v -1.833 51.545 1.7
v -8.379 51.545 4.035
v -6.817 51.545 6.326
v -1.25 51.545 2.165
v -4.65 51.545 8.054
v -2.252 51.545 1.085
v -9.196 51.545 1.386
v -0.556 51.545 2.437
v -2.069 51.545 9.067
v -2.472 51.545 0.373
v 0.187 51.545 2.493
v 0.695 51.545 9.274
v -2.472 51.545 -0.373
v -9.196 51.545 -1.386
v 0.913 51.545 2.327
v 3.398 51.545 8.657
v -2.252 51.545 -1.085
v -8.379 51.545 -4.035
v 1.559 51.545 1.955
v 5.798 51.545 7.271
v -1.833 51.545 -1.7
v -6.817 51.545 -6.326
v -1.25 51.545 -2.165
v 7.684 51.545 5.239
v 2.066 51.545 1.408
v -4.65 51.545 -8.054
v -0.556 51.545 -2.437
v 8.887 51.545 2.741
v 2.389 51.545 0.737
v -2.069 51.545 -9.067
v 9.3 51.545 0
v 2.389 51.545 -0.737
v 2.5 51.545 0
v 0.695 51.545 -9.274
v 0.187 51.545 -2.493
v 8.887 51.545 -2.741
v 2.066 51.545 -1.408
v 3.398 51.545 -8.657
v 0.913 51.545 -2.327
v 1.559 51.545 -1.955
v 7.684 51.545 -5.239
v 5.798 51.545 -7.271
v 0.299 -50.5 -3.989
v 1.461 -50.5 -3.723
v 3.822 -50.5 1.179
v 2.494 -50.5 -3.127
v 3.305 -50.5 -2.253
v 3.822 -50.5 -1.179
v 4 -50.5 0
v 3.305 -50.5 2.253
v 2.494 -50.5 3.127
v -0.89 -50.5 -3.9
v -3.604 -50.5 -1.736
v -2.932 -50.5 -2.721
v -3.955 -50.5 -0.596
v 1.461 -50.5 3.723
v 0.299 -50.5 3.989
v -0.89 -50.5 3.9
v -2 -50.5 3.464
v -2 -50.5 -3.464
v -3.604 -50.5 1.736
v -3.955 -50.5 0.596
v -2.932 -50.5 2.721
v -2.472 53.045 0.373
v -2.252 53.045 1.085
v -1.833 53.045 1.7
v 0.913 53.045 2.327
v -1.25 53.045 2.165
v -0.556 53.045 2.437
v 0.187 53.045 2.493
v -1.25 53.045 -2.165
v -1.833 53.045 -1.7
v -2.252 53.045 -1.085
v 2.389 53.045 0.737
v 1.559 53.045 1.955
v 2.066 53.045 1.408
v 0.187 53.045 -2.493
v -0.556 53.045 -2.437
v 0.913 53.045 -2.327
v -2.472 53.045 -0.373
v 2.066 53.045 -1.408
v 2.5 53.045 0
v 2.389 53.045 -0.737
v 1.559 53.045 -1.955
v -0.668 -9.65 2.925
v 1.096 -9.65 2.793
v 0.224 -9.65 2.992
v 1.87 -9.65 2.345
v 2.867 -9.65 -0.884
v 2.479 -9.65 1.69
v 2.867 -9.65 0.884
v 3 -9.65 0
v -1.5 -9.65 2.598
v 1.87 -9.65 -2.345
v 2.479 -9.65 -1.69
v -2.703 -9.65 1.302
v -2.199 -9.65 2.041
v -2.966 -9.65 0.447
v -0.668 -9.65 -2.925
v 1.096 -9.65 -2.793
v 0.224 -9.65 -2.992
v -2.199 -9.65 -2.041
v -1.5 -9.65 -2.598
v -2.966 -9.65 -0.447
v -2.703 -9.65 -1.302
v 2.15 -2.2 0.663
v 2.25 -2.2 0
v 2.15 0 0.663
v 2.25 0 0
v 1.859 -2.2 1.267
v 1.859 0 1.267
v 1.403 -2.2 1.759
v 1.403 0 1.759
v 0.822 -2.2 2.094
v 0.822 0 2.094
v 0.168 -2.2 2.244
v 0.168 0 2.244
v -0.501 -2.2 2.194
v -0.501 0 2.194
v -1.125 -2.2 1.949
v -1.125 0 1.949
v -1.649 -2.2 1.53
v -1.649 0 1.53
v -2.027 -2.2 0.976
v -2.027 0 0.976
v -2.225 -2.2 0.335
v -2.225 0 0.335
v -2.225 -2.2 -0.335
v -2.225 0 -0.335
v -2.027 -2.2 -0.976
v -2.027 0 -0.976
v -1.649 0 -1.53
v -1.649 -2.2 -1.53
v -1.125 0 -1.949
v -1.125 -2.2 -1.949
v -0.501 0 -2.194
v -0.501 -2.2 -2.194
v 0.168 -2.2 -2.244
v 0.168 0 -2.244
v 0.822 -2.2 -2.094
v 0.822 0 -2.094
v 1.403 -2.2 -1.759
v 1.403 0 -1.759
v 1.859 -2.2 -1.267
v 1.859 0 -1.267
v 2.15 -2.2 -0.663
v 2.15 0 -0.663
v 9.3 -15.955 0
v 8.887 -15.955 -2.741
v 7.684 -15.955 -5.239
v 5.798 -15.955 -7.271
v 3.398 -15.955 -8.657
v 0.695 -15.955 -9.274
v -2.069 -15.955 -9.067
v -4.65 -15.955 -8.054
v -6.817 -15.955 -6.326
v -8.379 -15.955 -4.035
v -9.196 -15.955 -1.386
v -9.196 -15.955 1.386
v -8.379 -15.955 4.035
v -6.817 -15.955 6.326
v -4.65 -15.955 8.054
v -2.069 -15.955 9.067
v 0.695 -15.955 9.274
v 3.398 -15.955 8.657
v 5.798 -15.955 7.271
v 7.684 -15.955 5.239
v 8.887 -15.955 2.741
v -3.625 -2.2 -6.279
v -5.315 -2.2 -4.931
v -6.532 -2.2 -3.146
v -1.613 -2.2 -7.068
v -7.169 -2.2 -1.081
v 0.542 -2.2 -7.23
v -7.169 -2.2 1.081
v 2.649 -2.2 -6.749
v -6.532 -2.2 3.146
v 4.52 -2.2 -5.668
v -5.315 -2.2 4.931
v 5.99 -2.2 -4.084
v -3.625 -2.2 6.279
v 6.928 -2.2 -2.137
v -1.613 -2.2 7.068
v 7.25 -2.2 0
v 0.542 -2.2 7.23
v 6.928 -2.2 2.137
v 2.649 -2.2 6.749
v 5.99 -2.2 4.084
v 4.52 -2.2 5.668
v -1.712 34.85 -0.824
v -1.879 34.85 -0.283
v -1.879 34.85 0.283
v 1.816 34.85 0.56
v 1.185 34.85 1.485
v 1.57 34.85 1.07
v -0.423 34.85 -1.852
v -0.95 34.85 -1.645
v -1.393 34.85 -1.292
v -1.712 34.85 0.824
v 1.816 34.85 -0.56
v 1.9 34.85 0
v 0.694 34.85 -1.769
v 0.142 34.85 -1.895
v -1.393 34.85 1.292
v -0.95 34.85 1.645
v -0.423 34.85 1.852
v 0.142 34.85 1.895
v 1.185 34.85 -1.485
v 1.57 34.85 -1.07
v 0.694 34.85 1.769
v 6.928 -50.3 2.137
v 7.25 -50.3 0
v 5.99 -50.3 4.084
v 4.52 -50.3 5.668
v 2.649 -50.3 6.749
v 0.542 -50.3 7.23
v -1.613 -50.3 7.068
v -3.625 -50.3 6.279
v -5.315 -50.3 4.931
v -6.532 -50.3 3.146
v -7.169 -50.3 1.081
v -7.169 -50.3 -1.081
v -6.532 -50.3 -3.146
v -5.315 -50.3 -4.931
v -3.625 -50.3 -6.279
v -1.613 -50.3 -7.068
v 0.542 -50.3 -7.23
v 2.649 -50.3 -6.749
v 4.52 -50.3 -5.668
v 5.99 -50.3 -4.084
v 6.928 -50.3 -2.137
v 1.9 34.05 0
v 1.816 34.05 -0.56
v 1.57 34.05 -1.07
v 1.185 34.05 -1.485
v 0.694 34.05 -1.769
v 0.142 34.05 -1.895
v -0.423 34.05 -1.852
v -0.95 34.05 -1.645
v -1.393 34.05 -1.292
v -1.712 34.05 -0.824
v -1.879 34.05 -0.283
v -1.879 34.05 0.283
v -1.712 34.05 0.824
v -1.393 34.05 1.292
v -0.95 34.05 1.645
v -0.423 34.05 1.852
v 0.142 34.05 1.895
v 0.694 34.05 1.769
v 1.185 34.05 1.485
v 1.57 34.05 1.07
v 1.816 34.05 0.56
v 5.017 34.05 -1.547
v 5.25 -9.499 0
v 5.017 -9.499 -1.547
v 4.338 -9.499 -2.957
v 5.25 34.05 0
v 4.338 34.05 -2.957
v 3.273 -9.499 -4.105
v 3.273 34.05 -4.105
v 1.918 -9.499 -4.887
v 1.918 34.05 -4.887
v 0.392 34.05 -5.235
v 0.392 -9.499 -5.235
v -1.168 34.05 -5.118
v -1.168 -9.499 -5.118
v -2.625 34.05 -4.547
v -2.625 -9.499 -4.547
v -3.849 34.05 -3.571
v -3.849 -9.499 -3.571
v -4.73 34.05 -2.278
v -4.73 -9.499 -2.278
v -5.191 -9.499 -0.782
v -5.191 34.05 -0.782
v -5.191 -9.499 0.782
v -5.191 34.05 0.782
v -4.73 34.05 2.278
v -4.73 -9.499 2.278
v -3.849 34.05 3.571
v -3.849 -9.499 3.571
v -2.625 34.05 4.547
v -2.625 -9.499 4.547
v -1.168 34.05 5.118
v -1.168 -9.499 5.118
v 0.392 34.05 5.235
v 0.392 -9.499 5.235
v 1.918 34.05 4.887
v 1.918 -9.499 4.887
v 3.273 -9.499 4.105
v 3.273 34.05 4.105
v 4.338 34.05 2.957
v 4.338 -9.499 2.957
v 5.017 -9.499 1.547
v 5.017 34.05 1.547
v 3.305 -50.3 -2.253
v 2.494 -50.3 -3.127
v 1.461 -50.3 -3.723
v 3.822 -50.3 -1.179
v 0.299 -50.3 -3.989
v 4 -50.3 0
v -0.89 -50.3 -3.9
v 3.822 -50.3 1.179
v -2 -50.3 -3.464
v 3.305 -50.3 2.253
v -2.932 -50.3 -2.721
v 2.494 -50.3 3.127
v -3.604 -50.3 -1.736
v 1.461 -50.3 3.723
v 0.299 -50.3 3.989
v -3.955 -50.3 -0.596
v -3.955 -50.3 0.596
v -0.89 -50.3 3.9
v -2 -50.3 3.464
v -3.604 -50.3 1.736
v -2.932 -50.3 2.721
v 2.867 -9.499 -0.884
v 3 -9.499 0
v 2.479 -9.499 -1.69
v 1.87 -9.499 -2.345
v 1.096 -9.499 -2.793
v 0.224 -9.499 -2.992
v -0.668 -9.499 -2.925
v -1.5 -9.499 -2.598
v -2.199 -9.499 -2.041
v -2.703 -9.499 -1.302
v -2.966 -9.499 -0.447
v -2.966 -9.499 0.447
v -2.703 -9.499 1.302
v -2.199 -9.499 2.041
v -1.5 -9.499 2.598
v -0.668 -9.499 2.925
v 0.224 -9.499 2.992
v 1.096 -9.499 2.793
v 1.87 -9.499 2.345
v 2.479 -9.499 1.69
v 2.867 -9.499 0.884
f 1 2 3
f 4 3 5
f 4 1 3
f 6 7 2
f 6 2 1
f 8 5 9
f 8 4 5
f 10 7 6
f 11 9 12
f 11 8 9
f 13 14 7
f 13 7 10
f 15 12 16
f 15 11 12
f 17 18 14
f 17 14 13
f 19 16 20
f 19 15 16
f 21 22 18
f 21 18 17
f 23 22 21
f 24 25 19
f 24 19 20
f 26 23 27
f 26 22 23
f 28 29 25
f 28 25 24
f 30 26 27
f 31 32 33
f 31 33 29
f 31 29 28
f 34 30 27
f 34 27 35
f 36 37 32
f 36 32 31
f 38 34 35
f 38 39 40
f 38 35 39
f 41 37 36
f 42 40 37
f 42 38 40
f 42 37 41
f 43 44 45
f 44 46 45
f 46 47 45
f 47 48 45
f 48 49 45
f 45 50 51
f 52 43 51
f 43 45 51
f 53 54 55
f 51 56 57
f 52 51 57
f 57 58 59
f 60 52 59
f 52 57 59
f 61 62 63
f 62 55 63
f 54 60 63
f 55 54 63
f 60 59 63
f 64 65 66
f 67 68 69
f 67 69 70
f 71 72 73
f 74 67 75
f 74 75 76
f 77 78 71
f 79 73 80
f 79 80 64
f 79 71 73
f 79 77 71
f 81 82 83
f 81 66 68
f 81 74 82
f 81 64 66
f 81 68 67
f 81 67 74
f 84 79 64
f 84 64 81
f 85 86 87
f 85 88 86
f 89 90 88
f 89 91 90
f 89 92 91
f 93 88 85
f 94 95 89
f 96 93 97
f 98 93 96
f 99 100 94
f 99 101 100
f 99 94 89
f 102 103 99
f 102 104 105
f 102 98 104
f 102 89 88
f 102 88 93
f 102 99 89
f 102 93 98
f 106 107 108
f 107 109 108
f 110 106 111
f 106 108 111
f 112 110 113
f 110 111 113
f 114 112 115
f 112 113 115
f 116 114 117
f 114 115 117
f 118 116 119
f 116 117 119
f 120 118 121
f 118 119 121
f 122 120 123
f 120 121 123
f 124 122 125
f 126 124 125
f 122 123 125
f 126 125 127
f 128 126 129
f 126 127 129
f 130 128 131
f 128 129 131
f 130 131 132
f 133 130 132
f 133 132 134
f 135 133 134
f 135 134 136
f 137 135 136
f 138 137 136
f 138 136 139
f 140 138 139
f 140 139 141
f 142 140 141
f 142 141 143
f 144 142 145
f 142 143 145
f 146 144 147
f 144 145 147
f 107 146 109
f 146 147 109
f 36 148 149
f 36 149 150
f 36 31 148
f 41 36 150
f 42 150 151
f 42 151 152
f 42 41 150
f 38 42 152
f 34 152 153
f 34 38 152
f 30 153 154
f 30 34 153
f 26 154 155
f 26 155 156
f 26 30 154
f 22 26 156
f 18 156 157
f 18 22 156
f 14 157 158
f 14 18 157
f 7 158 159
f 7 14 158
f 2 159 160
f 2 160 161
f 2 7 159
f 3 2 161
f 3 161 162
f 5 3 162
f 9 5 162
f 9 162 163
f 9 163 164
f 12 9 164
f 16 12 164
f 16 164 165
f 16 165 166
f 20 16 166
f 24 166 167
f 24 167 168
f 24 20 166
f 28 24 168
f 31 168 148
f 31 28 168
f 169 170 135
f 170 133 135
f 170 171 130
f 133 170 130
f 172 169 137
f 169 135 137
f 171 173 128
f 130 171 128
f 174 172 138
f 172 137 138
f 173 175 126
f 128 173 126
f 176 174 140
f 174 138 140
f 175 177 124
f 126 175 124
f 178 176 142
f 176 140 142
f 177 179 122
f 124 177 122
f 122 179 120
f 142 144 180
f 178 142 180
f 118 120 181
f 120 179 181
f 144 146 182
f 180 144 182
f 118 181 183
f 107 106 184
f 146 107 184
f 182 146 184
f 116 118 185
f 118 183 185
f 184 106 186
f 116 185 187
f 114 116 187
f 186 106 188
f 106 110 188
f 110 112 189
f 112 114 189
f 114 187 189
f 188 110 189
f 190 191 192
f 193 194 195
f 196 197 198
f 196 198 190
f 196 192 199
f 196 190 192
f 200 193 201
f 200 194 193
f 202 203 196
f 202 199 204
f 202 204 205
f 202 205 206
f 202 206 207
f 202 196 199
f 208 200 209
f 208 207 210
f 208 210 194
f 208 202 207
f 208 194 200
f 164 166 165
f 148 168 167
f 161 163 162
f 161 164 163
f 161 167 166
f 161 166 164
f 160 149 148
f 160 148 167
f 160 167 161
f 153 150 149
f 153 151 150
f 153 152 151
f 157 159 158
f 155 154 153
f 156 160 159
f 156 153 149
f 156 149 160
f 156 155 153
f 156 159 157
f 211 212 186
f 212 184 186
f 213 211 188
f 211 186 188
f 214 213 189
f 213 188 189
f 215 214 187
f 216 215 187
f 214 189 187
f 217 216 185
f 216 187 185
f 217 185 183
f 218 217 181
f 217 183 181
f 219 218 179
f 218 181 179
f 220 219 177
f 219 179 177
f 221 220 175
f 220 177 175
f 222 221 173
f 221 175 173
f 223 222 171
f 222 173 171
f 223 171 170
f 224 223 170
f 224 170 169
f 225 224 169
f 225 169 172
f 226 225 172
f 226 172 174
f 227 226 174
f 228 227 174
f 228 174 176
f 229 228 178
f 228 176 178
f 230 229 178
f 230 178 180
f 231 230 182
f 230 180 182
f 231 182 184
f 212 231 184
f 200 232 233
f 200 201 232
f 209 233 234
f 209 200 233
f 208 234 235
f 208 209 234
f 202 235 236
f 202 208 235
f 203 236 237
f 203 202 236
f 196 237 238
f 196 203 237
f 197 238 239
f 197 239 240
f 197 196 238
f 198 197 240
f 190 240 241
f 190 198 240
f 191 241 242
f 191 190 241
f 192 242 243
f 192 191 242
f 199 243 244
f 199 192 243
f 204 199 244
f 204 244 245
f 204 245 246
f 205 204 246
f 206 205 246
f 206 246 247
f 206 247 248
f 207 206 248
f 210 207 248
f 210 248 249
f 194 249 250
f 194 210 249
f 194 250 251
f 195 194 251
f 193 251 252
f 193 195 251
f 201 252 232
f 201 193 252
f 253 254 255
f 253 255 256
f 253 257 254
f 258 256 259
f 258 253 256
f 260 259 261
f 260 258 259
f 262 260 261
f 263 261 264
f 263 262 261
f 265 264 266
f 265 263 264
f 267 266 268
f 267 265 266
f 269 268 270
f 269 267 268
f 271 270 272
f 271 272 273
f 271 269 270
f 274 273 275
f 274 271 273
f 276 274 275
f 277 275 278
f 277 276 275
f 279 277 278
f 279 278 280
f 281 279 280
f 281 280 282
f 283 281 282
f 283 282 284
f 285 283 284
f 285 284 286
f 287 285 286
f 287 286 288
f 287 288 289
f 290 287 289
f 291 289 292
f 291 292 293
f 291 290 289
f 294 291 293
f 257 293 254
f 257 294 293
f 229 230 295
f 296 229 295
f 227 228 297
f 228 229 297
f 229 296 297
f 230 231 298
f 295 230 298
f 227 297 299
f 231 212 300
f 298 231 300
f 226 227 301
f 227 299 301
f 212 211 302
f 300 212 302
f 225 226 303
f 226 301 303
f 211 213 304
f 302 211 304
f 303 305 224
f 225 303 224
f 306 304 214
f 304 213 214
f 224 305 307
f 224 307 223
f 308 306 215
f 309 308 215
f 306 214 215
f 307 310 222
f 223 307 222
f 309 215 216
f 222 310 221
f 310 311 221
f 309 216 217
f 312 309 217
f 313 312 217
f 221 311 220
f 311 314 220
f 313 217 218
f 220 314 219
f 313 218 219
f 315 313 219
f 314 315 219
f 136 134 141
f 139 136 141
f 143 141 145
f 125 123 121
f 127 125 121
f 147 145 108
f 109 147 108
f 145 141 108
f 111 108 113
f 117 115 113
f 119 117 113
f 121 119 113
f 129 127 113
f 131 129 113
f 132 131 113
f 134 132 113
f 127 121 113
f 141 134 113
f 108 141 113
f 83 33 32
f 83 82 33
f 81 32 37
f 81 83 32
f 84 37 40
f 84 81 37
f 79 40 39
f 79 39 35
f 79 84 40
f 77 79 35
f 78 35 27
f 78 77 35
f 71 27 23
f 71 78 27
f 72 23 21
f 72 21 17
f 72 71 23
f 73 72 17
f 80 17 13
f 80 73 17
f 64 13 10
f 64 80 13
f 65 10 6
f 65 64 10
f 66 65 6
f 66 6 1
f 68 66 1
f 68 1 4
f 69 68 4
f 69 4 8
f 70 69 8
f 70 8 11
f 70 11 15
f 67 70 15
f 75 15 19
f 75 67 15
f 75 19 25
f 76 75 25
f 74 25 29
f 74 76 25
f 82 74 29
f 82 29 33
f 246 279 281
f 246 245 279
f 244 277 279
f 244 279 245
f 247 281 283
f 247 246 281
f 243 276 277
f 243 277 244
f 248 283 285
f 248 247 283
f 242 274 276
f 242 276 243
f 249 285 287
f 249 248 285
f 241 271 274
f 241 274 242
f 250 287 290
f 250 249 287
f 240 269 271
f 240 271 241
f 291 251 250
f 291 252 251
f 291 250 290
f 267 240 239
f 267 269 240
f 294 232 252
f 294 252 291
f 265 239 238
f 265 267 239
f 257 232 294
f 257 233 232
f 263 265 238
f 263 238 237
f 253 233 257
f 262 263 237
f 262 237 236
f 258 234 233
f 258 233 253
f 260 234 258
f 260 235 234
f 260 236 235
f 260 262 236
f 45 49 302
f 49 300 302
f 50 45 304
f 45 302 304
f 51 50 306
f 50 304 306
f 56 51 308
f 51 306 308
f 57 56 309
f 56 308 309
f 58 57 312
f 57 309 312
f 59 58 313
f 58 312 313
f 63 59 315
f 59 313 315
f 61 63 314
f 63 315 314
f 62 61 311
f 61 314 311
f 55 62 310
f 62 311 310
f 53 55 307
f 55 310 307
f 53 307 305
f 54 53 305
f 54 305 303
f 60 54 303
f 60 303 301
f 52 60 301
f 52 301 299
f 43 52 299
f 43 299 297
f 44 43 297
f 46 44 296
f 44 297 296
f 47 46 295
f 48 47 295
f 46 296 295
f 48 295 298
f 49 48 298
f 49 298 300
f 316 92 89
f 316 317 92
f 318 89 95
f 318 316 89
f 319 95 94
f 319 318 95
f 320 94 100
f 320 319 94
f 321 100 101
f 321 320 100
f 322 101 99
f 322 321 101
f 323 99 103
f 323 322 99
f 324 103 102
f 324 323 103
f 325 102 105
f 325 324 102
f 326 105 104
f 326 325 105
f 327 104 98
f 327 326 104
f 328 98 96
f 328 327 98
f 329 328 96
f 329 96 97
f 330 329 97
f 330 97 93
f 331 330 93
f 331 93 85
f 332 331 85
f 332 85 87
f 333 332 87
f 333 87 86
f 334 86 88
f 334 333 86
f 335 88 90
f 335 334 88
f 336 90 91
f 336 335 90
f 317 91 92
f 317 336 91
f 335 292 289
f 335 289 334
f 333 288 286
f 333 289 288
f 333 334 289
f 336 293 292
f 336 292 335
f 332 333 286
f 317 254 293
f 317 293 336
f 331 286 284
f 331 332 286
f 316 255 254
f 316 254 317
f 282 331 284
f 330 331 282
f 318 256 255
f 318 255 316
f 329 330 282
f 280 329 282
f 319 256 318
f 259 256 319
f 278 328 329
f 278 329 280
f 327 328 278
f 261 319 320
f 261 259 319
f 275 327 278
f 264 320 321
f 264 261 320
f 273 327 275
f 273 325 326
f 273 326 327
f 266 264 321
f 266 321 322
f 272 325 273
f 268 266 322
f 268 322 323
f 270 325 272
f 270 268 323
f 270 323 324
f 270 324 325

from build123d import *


with BuildPart() as f1:
    # F0 (on Top) → F1 (revolve)
    with BuildSketch(Plane.XY):
        Polygon((2.25, 0), (0, 0), (0, -50.5), (4, -50.5), (4, -50.3), (7.25, -50.3), (7.25, -2.2), (2.25, -2.2), align=None)
    revolve(axis=Axis((0, 17.907274, 0), (0, -1, 0)))


with BuildPart() as f3:
    # F2 (on Top) → F3 (revolve)
    with BuildSketch(Plane.XY):
        Polygon((1.9, 34.849632), (0, 34.849632), (0, -9.650368), (3, -9.650368), (3, -9.499413), (5.25, -9.499413), (5.25, 34.049632), (1.9, 34.049632), align=None)
    revolve(axis=Axis((0, 12.599632, 0), (0, 1, 0)))


with BuildPart() as f5:
    # F4 (on Top) → F5 (revolve)
    with BuildSketch(Plane.XY):
        Polygon((2.5, 53.045089), (0, 53.045089), (0, -15.954911), (9.3, -15.954911), (9.3, 51.545089), (2.5, 51.545089), align=None)
    revolve(axis=Axis((0, 18.545089, 0), (0, 1, 0)))


solid = Compound([f1.part, f3.part, f5.part])
